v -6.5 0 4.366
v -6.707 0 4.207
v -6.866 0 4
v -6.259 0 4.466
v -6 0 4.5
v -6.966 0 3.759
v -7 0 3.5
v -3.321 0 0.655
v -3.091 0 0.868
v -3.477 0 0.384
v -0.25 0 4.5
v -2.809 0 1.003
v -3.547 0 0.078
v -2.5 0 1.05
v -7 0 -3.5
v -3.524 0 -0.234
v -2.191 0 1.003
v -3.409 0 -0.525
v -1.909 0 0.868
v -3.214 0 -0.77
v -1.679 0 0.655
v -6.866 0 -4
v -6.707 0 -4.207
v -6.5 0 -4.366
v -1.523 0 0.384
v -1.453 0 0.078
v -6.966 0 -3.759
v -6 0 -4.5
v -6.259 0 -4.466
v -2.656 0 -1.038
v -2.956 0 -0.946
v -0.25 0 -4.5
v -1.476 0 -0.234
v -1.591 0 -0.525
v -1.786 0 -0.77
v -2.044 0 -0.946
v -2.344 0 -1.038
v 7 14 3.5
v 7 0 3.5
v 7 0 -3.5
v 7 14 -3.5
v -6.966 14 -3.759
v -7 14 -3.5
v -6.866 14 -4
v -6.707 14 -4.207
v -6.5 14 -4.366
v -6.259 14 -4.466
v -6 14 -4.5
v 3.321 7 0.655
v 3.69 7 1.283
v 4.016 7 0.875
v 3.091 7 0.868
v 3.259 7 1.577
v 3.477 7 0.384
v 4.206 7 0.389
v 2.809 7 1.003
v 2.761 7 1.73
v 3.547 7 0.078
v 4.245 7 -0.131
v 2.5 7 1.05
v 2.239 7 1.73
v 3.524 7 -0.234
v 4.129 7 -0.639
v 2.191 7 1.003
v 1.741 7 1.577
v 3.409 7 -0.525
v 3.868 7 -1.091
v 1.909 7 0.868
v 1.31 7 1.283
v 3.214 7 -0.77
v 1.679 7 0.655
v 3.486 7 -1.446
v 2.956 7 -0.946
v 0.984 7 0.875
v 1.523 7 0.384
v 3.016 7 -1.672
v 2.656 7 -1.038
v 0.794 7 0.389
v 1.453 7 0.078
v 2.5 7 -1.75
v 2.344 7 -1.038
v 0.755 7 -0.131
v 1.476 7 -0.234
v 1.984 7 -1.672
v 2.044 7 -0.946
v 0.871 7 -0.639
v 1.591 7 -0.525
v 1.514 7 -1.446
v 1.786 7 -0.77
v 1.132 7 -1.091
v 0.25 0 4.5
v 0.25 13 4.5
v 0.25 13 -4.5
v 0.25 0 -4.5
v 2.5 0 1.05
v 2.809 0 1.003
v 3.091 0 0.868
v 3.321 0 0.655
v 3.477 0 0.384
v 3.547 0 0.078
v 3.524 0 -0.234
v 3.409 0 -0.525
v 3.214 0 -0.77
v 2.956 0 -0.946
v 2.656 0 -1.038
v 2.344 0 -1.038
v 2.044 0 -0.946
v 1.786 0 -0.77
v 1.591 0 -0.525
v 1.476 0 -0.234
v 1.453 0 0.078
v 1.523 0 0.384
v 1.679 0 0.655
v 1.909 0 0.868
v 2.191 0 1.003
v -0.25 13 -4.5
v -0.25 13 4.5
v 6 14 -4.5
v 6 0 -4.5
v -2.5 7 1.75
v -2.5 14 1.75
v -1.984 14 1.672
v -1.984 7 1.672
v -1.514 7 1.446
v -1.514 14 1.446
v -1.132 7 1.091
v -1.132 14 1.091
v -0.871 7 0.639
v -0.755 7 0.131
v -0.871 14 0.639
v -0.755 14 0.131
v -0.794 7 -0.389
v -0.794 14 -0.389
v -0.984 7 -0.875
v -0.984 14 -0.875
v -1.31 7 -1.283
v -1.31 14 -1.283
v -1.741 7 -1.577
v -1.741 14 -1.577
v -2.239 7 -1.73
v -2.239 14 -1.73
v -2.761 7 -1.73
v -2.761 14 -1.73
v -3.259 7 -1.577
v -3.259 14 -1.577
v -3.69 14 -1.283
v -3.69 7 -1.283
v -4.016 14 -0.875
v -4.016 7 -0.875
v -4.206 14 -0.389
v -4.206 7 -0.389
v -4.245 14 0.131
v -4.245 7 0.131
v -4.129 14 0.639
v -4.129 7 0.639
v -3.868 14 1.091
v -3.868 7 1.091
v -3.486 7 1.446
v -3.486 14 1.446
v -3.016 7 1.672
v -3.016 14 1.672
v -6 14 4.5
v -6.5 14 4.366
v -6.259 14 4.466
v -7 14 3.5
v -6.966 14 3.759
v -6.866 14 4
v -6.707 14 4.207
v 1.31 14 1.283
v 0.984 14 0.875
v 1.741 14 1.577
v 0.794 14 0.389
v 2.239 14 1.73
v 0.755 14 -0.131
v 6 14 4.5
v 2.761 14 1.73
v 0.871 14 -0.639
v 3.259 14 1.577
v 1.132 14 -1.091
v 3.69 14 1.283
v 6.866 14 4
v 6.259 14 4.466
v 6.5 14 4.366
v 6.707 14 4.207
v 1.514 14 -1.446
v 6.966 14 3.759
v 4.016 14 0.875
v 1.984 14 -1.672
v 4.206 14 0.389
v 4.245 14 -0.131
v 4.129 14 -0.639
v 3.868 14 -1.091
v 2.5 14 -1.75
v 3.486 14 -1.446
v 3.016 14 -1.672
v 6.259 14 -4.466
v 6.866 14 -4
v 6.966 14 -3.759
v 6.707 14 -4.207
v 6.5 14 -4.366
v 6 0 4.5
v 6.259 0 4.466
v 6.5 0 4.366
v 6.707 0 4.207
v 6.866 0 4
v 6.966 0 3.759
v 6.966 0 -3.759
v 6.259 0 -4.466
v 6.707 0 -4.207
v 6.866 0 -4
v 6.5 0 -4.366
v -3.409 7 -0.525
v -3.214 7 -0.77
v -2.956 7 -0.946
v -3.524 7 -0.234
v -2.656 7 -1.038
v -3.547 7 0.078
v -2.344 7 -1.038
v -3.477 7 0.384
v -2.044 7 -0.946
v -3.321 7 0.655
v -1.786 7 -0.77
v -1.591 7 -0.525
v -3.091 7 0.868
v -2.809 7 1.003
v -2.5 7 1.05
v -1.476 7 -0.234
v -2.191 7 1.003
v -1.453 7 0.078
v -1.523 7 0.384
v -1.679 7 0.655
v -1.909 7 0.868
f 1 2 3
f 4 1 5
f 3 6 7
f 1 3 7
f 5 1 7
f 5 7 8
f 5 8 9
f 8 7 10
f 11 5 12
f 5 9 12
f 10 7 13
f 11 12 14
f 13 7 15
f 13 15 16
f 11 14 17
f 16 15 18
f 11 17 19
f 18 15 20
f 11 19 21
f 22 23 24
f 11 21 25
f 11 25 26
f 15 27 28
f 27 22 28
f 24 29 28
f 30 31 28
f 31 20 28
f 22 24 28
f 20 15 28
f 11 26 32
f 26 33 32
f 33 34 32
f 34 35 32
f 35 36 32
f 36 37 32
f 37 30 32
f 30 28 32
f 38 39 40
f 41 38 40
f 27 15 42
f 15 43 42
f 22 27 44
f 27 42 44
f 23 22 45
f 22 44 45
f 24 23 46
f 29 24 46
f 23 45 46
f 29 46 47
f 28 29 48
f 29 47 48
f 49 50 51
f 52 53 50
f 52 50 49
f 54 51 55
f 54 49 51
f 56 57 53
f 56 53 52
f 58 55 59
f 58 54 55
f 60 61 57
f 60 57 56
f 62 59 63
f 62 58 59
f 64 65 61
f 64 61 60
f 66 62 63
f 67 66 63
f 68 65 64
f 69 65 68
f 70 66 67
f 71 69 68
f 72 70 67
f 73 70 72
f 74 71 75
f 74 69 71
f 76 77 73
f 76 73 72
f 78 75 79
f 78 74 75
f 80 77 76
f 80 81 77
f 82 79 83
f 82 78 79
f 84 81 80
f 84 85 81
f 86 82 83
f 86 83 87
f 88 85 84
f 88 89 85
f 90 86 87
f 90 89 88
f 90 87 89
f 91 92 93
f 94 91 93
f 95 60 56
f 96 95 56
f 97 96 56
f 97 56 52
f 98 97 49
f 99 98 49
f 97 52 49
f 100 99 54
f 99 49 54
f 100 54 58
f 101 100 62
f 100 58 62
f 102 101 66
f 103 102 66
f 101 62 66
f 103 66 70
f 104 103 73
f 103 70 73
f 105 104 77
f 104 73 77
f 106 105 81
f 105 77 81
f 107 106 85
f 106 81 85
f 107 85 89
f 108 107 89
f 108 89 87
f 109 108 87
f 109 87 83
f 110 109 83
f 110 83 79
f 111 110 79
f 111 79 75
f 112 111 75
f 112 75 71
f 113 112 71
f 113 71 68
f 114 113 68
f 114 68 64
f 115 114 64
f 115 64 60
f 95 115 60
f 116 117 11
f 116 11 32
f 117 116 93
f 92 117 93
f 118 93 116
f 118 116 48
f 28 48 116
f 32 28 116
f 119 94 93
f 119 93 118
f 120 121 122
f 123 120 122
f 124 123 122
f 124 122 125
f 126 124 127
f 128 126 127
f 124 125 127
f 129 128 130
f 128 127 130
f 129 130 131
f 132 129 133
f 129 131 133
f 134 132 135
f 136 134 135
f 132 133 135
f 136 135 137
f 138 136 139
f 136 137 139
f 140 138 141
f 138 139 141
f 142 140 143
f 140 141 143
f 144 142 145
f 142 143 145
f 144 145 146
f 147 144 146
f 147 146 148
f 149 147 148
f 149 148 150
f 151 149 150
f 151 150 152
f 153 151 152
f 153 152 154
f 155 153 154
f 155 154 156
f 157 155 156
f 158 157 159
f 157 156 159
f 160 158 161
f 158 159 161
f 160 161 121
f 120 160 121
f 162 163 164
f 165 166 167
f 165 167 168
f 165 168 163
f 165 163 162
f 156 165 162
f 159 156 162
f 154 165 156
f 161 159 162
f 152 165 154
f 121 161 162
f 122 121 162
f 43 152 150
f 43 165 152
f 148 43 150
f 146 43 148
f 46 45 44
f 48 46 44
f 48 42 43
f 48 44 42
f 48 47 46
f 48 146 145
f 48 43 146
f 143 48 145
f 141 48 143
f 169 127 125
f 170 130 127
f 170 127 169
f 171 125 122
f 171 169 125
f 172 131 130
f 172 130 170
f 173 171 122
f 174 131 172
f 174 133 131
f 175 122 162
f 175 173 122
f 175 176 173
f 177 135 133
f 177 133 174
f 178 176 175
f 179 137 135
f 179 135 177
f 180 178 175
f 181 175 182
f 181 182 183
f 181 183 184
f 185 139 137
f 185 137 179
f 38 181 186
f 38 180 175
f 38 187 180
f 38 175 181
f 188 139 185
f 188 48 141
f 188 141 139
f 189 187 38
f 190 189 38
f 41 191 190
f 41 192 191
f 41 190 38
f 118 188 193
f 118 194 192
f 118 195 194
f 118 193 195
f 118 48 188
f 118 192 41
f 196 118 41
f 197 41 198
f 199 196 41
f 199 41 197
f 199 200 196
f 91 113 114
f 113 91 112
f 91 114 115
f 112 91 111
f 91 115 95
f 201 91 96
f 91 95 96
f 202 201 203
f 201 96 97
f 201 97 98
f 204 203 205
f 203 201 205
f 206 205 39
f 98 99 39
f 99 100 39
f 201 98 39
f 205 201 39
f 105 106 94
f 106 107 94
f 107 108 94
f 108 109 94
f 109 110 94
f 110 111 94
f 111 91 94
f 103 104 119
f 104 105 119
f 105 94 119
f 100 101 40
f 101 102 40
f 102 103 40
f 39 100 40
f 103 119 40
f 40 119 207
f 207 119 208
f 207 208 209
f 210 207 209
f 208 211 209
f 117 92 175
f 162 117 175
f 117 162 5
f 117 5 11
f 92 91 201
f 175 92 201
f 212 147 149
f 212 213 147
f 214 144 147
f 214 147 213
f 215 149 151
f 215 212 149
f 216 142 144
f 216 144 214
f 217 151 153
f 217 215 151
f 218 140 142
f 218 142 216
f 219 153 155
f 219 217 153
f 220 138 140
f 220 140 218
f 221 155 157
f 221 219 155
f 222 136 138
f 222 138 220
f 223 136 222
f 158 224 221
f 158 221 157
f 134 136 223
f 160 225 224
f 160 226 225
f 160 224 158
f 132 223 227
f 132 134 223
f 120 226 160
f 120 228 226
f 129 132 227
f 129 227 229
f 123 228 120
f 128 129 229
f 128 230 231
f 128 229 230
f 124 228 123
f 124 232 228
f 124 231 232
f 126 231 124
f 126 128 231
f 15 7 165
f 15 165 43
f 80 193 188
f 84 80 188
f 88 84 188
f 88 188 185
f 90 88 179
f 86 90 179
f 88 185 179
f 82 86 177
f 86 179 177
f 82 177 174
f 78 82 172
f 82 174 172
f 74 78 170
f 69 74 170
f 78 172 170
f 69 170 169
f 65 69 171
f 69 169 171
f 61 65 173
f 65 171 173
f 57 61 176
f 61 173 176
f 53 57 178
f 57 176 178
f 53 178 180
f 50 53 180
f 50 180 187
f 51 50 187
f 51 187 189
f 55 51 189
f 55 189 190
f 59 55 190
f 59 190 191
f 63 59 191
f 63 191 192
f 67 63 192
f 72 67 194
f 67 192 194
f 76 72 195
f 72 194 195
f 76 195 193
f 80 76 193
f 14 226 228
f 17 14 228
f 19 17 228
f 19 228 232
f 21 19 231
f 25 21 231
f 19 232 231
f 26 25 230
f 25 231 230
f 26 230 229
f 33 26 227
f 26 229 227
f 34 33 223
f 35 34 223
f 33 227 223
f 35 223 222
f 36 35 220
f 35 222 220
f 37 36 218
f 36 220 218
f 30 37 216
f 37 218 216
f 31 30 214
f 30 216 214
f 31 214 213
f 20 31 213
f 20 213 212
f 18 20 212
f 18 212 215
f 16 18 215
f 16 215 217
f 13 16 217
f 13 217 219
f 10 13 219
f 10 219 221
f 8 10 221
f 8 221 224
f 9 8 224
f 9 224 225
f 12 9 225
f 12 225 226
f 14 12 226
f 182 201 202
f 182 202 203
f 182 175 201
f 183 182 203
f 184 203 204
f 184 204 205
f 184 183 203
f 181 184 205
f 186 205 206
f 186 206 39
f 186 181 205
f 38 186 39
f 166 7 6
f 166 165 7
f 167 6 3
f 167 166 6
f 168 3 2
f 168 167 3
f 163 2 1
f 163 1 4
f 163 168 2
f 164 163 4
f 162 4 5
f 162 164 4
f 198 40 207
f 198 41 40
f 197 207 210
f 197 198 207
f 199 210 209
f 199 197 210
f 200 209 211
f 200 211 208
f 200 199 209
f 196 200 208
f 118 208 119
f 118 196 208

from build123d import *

# Parameters (mm, degrees)
SKETCH_1_W          = 14
SKETCH_1_H          = 9
EXTRUDE_1_DEPTH     = 14
FILLET_1_R          = 1
SKETCH_3_R          = 1.75
CUT_EXTRUDE_2_DEPTH = 7
CUT_EXTRUDE_3_REACH = 12.874
SKETCH_4_R          = 1.05
CUT_EXTRUDE_START   = -14
SKETCH_6_W          = 0.5
SKETCH_6_H          = 9
CUT_EXTRUDE_4_DEPTH = 13


with BuildPart() as part:
    # 草图1 → 凸台-拉伸1 (new body)
    with BuildSketch(Plane(origin=(0, 0, 0), x_dir=(1, 0, 0), z_dir=(0, 1, 0))):
        Rectangle(SKETCH_1_W, SKETCH_1_H)
    extrude(amount=EXTRUDE_1_DEPTH)

    # 圆角1
    fillet_1_edges = [part.edges().sort_by_distance(p)[0] for p in [
        (7, 7, 4.5),
        (-7, 7, 4.5),
        (-7, 7, -4.5),
        (7, 7, -4.5),
    ]]
    fillet(fillet_1_edges, radius=FILLET_1_R)

    # 草图3 → 切除-拉伸2 (cut)
    with BuildSketch(Plane(origin=(0, 14, 0), x_dir=(1, 0, 0), z_dir=(0, 1, 0))):
        with Locations(Location((-2.5, 0, 0), (0, 0, 270))):
            Circle(SKETCH_3_R)
        with Locations(Location((2.5, 0, 0), (0, 0, 90))):
            Circle(SKETCH_3_R)
    extrude(amount=-CUT_EXTRUDE_2_DEPTH, mode=Mode.SUBTRACT)

    # 草图4 → 切除-拉伸3 (cut, up to next)
    with BuildSketch(Plane(origin=(0, 7, 0), x_dir=(1, 0, 0), z_dir=(0, 1, 0)), mode=Mode.PRIVATE) as cut_extrude_3_sk1:
        with Locations(Location((-2.5, 0, 0), (0, 0, 270))):
            Circle(SKETCH_4_R)
    cut_extrude_3_tool1 = extrude(cut_extrude_3_sk1.sketch, amount=-CUT_EXTRUDE_3_REACH, mode=Mode.PRIVATE) & part.part
    # 草图4 → 切除-拉伸3 (cut, up to next)
    with BuildSketch(Plane(origin=(0, 7, 0), x_dir=(1, 0, 0), z_dir=(0, 1, 0)), mode=Mode.PRIVATE) as cut_extrude_3_sk2:
        with Locations(Location((2.5, 0, 0), (0, 0, 270))):
            Circle(SKETCH_4_R)
    cut_extrude_3_tool2 = extrude(cut_extrude_3_sk2.sketch, amount=-CUT_EXTRUDE_3_REACH, mode=Mode.PRIVATE) & part.part
    add(cut_extrude_3_tool1.solids().sort_by_distance((-2.5, 7, 0))[0], mode=Mode.SUBTRACT)
    add(cut_extrude_3_tool2.solids().sort_by_distance((2.5, 7, 0))[0], mode=Mode.SUBTRACT)

    # 草图6 → 切除-拉伸4 (cut)
    with BuildSketch(Plane(origin=(0, 14, 0), x_dir=(1, 0, 0), z_dir=(0, 1, 0)).offset(CUT_EXTRUDE_START)):
        Rectangle(SKETCH_6_W, SKETCH_6_H)
    extrude(amount=CUT_EXTRUDE_4_DEPTH, mode=Mode.SUBTRACT)


solid = part.part
